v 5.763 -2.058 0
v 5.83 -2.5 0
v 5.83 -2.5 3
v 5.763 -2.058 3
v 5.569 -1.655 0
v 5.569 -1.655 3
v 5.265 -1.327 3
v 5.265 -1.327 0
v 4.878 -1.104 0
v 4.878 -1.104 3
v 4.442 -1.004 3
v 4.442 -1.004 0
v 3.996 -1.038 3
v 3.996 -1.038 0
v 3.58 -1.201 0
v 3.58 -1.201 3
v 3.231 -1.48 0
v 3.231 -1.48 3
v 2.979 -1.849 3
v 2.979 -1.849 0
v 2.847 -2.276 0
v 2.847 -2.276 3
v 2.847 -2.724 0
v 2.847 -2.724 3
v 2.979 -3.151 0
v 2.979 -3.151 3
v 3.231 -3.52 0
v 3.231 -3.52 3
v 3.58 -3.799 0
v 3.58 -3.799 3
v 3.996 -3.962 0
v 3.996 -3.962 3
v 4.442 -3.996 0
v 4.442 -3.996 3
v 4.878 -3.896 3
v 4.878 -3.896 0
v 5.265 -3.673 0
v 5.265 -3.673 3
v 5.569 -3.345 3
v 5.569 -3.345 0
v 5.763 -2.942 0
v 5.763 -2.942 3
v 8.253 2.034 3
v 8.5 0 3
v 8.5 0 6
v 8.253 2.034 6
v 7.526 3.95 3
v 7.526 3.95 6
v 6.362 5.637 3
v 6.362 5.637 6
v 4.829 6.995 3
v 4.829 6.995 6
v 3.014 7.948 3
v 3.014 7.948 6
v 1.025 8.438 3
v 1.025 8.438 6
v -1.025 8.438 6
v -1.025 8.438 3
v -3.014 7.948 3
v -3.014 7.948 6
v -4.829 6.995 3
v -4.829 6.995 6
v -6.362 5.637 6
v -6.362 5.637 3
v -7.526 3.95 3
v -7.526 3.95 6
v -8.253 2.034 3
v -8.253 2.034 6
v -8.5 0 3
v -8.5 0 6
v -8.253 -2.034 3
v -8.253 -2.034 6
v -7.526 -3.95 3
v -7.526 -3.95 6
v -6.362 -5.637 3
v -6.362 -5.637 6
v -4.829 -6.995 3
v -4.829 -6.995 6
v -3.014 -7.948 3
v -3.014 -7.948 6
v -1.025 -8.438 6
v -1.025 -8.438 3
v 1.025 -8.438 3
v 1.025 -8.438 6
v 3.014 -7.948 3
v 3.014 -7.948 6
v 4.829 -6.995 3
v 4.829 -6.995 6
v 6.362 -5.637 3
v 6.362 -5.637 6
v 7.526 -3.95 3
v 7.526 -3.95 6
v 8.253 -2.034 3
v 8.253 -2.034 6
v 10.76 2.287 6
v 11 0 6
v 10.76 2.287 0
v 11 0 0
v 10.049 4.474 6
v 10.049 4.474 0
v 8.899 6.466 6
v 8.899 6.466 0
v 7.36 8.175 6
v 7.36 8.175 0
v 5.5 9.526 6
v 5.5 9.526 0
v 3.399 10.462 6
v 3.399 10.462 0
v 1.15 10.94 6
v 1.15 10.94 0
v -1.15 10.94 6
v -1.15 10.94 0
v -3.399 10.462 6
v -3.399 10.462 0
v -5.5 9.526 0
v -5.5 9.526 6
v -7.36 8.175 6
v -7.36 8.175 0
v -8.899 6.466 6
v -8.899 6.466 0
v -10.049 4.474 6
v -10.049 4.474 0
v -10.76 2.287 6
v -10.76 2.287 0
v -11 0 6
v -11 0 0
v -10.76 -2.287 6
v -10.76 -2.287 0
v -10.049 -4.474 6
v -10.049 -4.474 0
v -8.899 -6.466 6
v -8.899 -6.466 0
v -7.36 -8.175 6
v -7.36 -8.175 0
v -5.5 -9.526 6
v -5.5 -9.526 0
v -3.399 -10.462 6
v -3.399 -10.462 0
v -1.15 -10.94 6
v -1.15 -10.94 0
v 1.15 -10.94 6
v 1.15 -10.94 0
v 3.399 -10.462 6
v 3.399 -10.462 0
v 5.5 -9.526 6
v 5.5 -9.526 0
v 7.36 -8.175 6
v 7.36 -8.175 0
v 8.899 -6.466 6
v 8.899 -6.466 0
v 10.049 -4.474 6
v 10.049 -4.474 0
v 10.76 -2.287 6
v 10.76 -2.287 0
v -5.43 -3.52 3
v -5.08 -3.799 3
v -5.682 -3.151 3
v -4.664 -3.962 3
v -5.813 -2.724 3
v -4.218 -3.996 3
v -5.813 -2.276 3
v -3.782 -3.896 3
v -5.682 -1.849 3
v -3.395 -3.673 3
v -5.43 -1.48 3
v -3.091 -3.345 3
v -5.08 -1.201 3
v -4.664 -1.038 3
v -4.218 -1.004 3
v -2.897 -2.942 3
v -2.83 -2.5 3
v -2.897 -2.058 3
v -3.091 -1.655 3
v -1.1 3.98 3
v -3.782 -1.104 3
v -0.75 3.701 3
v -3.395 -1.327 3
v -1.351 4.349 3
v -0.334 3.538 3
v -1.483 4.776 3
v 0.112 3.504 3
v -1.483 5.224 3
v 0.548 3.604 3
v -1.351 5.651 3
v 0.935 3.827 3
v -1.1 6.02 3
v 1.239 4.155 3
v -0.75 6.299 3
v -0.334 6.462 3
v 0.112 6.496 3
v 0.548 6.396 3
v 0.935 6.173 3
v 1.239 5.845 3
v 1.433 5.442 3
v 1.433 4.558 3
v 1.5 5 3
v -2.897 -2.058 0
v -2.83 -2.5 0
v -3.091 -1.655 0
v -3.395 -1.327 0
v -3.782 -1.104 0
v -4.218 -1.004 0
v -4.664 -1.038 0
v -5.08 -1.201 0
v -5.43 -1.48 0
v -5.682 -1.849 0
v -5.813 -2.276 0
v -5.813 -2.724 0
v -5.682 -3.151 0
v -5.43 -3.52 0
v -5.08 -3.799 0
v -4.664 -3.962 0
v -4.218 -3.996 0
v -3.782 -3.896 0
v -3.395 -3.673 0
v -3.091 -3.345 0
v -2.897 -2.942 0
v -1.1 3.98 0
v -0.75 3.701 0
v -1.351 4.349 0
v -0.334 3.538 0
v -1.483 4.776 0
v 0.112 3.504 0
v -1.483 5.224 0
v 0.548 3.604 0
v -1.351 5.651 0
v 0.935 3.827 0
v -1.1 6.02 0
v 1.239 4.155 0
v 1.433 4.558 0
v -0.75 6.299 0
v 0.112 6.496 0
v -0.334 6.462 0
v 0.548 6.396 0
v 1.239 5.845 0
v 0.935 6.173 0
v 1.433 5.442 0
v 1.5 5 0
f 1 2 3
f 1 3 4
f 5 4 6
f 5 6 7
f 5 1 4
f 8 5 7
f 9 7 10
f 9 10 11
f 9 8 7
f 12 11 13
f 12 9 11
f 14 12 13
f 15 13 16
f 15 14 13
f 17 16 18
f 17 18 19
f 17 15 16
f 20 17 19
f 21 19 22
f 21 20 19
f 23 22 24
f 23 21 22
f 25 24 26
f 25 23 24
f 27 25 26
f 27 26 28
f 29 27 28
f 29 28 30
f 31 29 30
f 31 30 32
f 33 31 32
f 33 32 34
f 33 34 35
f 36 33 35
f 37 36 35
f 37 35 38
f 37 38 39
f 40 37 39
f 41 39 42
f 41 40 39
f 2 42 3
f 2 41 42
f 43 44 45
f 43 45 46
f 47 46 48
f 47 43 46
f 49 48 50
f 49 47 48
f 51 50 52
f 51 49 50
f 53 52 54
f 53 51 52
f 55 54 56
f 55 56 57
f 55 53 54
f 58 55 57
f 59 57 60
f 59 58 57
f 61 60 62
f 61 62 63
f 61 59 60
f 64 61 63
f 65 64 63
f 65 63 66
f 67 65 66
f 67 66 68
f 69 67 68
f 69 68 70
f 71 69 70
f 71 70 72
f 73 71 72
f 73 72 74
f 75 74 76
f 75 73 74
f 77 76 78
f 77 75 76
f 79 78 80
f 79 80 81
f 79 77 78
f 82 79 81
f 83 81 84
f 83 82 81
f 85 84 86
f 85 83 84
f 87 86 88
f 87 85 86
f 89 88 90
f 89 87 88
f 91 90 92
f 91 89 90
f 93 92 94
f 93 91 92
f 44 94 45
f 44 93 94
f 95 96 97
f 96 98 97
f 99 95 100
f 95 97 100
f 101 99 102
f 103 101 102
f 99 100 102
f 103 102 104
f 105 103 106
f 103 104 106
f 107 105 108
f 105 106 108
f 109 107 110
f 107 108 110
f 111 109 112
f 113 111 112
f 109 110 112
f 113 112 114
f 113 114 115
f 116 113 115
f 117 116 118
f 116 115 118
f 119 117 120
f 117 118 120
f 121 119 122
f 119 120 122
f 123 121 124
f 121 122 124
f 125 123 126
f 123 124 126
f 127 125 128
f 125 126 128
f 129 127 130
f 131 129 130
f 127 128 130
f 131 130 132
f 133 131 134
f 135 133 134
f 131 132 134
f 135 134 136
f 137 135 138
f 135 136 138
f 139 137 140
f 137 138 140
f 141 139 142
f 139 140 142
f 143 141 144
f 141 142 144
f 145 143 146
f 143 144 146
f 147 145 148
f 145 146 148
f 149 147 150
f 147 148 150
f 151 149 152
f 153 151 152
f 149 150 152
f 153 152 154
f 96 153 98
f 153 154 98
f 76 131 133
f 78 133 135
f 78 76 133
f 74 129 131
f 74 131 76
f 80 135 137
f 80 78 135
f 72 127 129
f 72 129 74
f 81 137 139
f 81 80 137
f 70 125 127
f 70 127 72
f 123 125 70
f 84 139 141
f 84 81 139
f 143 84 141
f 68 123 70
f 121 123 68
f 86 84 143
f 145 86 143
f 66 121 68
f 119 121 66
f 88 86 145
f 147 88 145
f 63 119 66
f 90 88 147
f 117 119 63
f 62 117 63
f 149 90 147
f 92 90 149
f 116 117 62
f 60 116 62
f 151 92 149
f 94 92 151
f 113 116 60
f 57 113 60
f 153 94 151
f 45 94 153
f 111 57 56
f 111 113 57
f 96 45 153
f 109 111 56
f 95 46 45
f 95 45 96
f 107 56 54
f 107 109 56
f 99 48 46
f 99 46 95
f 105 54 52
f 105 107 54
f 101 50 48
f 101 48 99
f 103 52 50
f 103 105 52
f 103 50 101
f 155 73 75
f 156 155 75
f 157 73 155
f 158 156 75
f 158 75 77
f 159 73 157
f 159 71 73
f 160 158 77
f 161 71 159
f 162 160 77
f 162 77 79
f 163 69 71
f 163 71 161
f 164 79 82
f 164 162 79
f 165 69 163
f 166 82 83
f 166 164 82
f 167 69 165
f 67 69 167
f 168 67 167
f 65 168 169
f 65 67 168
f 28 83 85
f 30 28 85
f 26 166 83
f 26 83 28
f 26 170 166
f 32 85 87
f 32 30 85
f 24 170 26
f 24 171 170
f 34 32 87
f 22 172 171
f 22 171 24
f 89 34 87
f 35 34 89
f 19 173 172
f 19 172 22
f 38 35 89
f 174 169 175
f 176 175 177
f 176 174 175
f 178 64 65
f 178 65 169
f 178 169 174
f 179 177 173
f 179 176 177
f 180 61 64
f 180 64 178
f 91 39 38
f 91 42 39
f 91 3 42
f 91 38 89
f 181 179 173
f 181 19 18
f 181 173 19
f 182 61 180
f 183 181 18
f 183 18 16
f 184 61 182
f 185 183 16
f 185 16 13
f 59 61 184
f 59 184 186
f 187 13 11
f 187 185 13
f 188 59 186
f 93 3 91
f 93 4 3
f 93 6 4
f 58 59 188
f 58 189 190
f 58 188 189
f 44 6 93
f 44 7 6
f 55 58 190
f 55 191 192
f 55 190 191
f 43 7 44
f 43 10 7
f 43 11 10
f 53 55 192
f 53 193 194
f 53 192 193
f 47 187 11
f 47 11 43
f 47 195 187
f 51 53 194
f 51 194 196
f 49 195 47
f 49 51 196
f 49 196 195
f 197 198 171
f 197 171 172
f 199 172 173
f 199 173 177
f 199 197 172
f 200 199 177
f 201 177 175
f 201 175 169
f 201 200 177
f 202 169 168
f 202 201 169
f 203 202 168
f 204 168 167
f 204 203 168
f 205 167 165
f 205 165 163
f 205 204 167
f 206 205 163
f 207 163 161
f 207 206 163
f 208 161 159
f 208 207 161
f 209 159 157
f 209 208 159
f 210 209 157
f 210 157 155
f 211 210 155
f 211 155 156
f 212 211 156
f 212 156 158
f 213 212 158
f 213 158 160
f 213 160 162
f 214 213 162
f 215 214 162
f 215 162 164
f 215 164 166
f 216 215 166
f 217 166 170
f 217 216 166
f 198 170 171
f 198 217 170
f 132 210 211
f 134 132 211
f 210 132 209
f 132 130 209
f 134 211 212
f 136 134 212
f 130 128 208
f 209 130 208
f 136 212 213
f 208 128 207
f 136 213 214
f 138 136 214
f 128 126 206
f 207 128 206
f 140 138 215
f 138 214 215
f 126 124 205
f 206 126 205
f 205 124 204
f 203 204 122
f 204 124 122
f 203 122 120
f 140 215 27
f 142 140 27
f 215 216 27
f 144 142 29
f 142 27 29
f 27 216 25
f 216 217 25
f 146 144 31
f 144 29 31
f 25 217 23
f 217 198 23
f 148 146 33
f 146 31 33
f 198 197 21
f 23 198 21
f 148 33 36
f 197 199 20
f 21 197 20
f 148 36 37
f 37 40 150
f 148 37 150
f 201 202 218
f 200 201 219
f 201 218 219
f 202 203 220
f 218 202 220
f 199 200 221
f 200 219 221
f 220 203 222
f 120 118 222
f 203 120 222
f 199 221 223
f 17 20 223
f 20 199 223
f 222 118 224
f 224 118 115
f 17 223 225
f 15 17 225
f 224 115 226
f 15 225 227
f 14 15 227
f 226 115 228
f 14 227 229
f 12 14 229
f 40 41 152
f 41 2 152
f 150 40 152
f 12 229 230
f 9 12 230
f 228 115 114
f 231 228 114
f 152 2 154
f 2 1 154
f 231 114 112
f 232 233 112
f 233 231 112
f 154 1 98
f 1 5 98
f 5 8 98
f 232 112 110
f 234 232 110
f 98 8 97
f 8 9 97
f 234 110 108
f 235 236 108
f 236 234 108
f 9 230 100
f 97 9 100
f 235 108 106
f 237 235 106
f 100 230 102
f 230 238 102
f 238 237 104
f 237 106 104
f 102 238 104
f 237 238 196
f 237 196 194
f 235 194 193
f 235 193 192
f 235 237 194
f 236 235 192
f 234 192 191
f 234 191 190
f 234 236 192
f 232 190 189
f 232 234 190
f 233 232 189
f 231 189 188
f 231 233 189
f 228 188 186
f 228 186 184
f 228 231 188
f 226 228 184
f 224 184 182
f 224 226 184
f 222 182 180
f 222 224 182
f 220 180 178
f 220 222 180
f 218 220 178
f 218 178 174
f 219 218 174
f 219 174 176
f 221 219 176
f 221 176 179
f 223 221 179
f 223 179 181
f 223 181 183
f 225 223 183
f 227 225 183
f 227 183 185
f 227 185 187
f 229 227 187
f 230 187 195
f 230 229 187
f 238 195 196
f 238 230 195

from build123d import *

# Parameters (mm, degrees)
ESQUISSE1_R        = 11
ESQUISSE1_R_2      = 1.5
BOSS_EXTRU_1_DEPTH = 3
ESQUISSE2_R        = 11
ESQUISSE2_R_2      = 8.5
BOSS_EXTRU_2_DEPTH = 3


with BuildPart() as part:
    # Esquisse1 → Boss.-Extru.1 (new body)
    with BuildSketch(Plane.XY):
        Circle(ESQUISSE1_R)
        with Locations((0, 5)):
            Circle(ESQUISSE1_R_2, mode=Mode.SUBTRACT)
        with Locations((4.330127019, -2.5)):
            Circle(ESQUISSE1_R_2, mode=Mode.SUBTRACT)
        with Locations((-4.330127019, -2.5)):
            Circle(ESQUISSE1_R_2, mode=Mode.SUBTRACT)
    extrude(amount=BOSS_EXTRU_1_DEPTH)

    # Esquisse2 → Boss.-Extru.2 (add)
    with BuildSketch(Plane.XY.offset(3)):
        Circle(ESQUISSE2_R)
        Circle(ESQUISSE2_R_2, mode=Mode.SUBTRACT)
    extrude(amount=BOSS_EXTRU_2_DEPTH)


solid = part.part
